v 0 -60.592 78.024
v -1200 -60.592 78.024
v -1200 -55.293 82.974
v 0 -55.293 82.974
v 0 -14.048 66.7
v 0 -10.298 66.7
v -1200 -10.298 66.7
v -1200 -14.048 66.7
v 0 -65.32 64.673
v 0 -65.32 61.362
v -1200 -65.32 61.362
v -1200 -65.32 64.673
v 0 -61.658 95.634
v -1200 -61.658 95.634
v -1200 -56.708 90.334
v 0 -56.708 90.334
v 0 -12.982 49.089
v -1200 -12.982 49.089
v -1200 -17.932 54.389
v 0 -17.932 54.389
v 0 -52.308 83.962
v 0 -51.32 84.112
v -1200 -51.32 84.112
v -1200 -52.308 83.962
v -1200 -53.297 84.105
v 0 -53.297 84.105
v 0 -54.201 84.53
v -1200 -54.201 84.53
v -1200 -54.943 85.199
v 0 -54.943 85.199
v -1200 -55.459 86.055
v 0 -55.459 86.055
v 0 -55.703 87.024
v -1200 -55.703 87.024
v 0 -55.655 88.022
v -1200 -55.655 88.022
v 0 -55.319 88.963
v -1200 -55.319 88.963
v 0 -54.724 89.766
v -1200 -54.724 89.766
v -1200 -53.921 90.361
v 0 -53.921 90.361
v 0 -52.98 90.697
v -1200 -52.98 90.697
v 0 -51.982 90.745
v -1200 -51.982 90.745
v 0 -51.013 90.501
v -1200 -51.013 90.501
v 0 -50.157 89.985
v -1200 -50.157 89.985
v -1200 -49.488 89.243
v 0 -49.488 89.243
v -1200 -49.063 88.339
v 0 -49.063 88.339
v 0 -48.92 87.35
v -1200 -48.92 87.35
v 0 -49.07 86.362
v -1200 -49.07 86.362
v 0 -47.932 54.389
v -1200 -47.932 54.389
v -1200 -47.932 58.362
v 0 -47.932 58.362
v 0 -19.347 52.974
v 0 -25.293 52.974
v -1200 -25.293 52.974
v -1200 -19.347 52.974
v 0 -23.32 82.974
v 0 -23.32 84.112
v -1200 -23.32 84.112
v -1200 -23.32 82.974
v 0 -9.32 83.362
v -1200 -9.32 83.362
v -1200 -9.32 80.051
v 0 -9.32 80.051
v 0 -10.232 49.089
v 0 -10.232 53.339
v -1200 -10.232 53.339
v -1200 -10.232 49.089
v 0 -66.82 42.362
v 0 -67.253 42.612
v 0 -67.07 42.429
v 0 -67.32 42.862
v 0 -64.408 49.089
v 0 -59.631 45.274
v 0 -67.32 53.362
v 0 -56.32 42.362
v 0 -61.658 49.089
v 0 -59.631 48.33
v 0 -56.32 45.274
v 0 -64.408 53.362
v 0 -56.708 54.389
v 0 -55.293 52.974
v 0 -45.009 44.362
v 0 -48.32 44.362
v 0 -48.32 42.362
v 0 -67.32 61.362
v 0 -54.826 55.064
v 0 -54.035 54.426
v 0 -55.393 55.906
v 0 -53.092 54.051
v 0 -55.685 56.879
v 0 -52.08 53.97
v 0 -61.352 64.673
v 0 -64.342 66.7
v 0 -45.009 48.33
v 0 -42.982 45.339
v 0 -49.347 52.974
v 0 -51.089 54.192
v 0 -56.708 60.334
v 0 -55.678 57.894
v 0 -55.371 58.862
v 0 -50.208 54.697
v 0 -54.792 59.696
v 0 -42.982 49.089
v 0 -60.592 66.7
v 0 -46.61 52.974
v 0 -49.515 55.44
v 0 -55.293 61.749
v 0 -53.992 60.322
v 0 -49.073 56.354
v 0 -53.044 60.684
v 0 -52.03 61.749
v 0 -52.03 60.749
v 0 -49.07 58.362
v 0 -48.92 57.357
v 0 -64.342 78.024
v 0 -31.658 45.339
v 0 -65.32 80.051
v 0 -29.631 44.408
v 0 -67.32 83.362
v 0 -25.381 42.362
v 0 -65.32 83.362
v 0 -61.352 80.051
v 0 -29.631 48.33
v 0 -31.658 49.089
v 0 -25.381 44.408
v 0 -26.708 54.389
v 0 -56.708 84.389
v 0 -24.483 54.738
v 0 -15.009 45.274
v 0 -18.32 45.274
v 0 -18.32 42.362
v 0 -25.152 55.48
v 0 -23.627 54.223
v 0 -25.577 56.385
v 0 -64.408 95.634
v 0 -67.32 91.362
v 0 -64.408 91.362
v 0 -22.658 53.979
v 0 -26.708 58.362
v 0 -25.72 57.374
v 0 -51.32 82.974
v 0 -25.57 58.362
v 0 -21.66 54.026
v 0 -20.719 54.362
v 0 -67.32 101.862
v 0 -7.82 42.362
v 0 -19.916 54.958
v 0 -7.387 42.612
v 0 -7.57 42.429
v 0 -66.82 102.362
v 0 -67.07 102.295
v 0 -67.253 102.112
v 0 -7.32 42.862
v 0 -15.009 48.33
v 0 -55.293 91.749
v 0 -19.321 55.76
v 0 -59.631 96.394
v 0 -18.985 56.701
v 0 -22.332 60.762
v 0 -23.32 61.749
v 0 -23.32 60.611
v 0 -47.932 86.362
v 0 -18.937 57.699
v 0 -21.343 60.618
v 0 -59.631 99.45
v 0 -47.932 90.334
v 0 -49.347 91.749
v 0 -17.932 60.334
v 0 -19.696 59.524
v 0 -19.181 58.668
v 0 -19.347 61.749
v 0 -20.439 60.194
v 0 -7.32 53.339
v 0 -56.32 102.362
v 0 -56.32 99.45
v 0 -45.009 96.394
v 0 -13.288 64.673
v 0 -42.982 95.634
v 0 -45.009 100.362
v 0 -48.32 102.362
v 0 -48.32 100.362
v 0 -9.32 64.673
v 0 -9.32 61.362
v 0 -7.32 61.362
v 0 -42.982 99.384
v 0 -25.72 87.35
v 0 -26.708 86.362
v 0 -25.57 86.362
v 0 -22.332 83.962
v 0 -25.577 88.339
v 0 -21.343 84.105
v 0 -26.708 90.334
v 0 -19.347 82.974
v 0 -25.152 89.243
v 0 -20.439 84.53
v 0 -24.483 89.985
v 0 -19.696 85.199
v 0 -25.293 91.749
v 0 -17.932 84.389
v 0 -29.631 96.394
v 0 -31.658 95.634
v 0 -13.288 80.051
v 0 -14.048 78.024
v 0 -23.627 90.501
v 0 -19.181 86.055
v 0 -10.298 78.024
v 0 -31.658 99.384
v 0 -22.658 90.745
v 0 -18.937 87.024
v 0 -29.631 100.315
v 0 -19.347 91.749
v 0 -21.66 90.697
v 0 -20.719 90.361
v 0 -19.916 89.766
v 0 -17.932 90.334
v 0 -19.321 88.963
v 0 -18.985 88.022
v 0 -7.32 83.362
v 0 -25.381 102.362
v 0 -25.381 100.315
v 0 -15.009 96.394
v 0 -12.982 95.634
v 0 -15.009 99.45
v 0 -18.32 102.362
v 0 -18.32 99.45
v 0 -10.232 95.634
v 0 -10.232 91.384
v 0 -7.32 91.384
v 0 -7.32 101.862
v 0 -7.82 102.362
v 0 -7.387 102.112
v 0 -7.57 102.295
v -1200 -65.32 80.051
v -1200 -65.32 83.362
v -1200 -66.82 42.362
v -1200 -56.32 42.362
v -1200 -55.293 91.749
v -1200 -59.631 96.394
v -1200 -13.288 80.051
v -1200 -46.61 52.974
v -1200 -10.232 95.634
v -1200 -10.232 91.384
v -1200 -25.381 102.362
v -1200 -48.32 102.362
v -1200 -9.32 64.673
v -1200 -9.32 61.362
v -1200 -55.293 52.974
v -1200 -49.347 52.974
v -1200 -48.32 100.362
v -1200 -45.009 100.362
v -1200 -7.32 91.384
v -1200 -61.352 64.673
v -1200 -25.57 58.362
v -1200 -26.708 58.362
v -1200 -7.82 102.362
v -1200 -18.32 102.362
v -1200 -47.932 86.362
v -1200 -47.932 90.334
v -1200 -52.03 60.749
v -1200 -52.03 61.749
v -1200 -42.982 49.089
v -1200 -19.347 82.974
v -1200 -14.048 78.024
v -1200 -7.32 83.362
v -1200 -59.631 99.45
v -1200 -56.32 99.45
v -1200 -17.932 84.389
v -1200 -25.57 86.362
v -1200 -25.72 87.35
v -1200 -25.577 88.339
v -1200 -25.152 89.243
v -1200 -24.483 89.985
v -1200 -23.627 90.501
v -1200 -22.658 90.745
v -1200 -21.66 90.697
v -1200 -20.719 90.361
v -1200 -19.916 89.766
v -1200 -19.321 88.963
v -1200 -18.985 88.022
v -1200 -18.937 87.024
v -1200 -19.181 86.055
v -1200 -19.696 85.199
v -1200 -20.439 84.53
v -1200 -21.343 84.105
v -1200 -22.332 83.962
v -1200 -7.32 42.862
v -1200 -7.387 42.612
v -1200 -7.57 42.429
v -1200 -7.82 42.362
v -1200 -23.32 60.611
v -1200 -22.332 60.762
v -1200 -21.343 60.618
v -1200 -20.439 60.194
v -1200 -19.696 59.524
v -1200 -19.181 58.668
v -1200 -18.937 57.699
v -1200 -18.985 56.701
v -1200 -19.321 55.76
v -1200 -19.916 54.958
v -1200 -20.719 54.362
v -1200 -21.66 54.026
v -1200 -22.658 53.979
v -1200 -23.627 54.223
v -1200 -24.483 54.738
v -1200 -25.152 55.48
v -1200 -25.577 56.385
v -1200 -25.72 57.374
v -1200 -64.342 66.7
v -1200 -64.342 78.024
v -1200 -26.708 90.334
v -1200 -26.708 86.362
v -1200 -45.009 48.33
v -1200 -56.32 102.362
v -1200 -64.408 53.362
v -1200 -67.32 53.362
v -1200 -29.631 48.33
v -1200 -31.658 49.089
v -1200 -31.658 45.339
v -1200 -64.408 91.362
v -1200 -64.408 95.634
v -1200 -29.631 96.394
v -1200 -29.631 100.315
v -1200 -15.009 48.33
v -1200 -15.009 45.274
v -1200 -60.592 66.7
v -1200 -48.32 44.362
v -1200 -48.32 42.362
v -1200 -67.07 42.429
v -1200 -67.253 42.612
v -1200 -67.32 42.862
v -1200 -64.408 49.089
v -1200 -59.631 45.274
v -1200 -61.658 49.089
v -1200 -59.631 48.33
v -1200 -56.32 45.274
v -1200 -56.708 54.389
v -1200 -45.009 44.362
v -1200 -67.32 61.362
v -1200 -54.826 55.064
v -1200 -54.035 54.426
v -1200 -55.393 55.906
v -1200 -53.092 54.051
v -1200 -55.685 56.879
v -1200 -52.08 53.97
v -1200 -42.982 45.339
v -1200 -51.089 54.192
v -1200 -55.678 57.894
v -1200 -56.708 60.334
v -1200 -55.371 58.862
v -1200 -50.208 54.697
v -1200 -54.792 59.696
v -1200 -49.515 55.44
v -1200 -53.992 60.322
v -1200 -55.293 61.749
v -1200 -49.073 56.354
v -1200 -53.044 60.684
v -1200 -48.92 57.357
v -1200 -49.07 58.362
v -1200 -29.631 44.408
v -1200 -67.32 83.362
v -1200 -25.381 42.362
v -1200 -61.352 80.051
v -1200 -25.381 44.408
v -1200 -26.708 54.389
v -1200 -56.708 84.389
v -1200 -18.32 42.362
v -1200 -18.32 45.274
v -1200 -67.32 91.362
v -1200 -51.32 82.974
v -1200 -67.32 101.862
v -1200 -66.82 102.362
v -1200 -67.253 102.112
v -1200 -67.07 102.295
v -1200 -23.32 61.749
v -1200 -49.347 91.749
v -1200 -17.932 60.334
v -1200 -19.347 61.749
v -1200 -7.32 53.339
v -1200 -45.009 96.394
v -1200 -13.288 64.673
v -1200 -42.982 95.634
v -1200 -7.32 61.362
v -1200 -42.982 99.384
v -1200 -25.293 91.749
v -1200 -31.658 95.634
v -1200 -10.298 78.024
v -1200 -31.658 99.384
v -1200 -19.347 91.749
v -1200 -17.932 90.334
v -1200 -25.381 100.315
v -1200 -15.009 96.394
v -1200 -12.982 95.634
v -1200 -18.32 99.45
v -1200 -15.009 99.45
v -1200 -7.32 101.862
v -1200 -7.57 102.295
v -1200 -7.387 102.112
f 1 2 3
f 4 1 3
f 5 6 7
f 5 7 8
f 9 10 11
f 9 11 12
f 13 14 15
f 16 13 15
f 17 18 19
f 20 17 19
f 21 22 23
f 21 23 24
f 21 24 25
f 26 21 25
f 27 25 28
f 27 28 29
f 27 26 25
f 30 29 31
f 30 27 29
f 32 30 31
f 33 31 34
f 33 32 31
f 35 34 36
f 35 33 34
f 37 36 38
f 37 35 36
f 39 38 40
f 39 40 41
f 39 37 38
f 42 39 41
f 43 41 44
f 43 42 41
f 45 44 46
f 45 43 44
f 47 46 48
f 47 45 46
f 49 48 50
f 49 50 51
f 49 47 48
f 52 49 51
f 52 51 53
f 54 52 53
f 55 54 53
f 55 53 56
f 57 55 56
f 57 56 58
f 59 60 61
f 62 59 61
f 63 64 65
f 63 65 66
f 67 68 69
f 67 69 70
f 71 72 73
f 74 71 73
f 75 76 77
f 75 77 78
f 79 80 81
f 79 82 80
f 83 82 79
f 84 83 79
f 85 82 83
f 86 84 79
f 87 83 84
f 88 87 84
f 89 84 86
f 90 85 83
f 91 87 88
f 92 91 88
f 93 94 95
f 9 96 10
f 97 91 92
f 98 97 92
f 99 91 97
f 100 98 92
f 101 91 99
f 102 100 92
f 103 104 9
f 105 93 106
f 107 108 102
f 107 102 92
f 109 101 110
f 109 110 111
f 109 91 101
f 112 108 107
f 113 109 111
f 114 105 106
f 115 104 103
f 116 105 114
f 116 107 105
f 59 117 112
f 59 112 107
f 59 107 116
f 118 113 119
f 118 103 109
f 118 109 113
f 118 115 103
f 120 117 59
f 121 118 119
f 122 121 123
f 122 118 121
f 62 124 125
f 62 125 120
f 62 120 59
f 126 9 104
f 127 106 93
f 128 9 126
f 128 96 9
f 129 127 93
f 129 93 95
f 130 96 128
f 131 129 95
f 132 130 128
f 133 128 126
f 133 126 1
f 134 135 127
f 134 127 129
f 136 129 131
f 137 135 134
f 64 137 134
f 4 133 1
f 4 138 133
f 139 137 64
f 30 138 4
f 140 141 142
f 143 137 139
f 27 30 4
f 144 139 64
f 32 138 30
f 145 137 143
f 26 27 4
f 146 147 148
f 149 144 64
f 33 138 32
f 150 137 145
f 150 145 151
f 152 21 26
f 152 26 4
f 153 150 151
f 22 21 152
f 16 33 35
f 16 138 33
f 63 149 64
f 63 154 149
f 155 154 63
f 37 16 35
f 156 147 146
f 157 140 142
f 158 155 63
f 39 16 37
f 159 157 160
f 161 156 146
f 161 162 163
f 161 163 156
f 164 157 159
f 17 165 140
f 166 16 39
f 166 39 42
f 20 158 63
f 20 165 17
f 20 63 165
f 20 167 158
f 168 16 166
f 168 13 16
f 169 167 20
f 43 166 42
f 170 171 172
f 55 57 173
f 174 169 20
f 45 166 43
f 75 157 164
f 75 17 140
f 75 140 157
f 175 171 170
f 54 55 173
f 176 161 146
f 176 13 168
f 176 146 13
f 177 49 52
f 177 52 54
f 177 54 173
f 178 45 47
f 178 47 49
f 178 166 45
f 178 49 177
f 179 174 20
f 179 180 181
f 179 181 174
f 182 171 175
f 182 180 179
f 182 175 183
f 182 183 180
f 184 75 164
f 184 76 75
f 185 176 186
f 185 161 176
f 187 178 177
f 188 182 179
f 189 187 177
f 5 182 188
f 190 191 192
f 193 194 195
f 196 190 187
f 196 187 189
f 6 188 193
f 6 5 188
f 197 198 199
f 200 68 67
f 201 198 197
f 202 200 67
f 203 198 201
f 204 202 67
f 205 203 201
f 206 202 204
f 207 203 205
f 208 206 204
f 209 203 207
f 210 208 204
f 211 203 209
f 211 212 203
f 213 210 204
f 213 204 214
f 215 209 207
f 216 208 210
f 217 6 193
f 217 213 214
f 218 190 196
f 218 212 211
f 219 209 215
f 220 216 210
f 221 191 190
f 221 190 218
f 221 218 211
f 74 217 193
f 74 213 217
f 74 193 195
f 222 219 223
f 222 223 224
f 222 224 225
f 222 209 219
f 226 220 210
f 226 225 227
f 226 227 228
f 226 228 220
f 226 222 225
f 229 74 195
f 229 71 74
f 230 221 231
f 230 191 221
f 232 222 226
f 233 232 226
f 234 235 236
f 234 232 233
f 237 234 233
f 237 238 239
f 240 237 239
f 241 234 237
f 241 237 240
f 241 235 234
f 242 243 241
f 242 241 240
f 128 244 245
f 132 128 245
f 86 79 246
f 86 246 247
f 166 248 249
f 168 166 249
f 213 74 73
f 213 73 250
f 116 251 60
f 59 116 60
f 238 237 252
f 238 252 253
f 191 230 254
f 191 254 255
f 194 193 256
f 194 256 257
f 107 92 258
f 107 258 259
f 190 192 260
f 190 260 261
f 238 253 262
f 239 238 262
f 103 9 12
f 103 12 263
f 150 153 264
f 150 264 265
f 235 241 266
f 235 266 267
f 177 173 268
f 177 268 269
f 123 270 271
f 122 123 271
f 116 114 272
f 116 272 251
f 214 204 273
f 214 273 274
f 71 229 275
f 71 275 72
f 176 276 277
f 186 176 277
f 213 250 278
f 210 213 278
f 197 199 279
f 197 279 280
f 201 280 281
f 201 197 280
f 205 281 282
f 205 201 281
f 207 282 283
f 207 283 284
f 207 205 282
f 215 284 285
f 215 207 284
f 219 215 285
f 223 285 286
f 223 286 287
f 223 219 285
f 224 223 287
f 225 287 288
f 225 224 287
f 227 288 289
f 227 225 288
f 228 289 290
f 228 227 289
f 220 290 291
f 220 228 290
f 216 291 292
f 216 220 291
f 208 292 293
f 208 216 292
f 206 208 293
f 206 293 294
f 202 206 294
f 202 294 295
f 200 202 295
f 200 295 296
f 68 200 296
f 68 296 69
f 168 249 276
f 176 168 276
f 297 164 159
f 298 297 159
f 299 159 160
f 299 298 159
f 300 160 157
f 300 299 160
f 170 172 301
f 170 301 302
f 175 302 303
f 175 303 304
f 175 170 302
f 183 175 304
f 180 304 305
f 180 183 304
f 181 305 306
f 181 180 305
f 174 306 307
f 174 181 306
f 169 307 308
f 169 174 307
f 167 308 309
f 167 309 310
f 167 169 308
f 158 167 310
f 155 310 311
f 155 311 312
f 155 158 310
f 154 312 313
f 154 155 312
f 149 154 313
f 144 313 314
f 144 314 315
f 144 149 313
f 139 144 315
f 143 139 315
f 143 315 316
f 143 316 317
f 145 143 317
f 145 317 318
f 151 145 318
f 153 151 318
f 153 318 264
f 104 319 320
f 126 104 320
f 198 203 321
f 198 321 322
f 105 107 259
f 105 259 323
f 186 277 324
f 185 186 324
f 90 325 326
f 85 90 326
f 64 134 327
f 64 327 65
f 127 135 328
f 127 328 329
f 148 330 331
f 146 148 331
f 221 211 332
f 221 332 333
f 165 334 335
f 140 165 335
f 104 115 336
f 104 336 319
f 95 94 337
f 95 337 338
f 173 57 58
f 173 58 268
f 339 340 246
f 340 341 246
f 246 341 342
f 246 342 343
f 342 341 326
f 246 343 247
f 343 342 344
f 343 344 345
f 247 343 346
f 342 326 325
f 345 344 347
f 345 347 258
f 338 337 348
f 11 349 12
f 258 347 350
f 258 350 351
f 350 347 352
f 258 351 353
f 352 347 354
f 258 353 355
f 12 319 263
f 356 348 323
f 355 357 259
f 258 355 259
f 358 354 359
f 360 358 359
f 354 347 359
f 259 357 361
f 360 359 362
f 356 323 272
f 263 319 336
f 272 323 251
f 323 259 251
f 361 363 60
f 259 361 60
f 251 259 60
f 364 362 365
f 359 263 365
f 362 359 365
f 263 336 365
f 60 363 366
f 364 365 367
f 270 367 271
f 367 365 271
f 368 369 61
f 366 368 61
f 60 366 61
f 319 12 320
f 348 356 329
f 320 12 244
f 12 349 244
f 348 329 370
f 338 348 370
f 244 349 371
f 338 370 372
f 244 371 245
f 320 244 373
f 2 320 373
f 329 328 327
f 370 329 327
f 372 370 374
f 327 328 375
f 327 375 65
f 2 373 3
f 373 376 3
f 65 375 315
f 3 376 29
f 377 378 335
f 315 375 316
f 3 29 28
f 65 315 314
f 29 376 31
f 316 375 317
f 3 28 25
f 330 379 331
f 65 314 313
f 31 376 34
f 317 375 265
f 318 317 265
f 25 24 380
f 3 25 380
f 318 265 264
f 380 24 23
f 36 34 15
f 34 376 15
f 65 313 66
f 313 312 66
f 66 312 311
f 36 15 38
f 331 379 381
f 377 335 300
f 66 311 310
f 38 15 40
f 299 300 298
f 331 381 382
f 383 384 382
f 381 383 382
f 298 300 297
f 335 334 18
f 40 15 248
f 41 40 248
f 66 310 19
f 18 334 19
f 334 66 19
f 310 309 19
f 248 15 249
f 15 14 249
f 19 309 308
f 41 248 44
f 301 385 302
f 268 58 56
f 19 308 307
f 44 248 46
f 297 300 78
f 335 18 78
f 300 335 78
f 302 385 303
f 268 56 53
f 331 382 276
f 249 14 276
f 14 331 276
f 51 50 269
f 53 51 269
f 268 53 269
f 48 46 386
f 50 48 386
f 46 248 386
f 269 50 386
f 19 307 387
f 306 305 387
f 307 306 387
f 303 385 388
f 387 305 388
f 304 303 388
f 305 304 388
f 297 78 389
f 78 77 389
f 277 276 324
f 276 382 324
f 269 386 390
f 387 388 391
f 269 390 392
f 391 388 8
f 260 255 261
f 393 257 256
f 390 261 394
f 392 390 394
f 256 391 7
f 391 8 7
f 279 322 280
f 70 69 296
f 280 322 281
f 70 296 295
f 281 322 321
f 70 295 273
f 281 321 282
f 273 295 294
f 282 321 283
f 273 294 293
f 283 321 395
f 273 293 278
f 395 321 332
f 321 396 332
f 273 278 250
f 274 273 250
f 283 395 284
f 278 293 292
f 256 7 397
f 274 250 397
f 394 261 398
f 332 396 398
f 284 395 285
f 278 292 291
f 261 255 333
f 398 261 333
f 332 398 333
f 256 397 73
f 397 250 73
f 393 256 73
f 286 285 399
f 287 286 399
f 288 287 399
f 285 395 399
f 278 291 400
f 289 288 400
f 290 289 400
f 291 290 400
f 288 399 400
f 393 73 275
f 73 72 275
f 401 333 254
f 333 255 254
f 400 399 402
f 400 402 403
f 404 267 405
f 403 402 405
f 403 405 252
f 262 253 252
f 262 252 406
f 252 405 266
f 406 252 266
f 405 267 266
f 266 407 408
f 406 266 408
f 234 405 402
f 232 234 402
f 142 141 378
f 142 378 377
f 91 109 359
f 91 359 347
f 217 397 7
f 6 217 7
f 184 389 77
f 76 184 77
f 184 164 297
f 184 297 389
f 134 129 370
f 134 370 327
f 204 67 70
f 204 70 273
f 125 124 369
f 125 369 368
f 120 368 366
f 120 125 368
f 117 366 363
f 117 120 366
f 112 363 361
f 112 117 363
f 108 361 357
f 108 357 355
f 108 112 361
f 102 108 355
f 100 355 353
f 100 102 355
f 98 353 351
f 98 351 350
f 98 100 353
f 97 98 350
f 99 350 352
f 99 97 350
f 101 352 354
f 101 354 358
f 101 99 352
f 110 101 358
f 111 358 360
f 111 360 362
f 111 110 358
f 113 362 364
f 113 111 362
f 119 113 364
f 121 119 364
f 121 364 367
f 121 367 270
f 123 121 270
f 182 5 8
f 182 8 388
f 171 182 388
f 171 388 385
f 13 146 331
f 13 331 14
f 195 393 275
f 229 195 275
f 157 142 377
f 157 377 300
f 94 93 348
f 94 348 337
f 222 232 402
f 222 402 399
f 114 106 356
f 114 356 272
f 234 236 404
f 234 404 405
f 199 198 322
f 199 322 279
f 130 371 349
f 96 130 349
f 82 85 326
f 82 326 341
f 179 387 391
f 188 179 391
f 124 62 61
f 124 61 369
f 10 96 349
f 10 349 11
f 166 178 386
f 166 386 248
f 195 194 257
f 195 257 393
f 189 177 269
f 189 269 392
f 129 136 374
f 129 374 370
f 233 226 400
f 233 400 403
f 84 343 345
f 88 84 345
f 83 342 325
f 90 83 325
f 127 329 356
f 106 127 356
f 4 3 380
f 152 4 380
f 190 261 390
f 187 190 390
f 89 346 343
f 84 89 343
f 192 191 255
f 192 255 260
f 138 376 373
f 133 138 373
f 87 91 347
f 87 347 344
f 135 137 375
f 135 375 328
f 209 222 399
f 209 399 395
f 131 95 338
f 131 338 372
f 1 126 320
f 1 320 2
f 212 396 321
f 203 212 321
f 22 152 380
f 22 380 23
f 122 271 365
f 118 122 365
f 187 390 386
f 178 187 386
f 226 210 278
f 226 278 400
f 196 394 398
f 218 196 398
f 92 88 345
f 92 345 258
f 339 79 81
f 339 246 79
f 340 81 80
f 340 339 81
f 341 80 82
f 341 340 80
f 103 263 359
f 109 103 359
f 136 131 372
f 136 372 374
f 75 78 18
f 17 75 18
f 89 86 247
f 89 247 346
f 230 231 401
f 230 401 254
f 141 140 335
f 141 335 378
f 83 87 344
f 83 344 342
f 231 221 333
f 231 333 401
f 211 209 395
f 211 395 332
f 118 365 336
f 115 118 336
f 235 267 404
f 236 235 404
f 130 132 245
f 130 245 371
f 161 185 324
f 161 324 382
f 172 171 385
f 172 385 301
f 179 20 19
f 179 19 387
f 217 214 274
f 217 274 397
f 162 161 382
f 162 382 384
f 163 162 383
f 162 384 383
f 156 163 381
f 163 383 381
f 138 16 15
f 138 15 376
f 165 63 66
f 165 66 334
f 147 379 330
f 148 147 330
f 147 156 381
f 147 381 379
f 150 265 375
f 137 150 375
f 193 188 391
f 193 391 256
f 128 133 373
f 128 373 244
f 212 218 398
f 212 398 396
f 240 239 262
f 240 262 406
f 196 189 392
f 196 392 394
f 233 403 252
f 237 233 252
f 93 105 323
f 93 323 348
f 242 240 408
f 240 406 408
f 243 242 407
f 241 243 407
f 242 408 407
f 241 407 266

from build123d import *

# Parameters (mm, degrees)
F1_DEPTH = 1200
F2_R     = 0.5


with BuildPart() as f1:
    # F0 (on Right) → F1 (new body)
    with BuildSketch(Plane.YZ):
        with BuildLine():
            Line((-47.932279, 54.389084), (-46.610482, 52.97405))
            Line((-46.610482, 52.97405), (-42.981779, 49.089383))
            Line((-42.981779, 49.089383), (-42.981779, 45.339383))
            Line((-42.981779, 45.339383), (-31.658049, 45.339383))
            Line((-31.658049, 45.339383), (-31.658049, 49.089383))
            Line((-31.658049, 49.089383), (-26.70755, 54.389084))
            Line((-26.70755, 54.389084), (-26.70755, 58.361686))
            Line((-26.70755, 58.361686), (-25.56953, 58.361686))
            ThreePointArc((-25.56953, 58.361686), (-19.915751, 54.957523), (-23.319914, 60.611301))
            Line((-23.319914, 60.611301), (-23.319914, 61.749321))
            Line((-23.319914, 61.749321), (-19.347313, 61.749321))
            Line((-19.347313, 61.749321), (-14.047611, 66.699821))
            Line((-14.047611, 66.699821), (-10.297611, 66.699821))
            Line((-10.297611, 66.699821), (-10.297611, 78.02355))
            Line((-10.297611, 78.02355), (-14.047611, 78.02355))
            Line((-14.047611, 78.02355), (-19.347313, 82.97405))
            Line((-19.347313, 82.97405), (-23.319914, 82.97405))
            Line((-23.319914, 82.97405), (-23.319914, 84.11207))
            ThreePointArc((-23.319914, 84.11207), (-19.915751, 89.765849), (-25.56953, 86.361686))
            Line((-25.56953, 86.361686), (-26.70755, 86.361686))
            Line((-26.70755, 86.361686), (-26.70755, 90.334287))
            Line((-26.70755, 90.334287), (-31.658049, 95.633989))
            Line((-31.658049, 95.633989), (-31.658049, 99.383989))
            Line((-31.658049, 99.383989), (-42.981779, 99.383989))
            Line((-42.981779, 99.383989), (-42.981779, 95.633989))
            Line((-42.981779, 95.633989), (-47.932279, 90.334287))
            Line((-47.932279, 90.334287), (-47.932279, 86.361686))
            Line((-47.932279, 86.361686), (-49.070299, 86.361686))
            ThreePointArc((-49.070299, 86.361686), (-54.724077, 89.765849), (-51.319914, 84.11207))
            Line((-51.319914, 84.11207), (-51.319914, 82.97405))
            Line((-51.319914, 82.97405), (-55.292516, 82.97405))
            Line((-55.292516, 82.97405), (-60.592217, 78.02355))
            Line((-60.592217, 78.02355), (-64.342217, 78.02355))
            Line((-64.342217, 78.02355), (-64.342217, 66.699821))
            Line((-64.342217, 66.699821), (-60.592217, 66.699821))
            Line((-60.592217, 66.699821), (-55.292516, 61.749321))
            Line((-55.292516, 61.749321), (-52.030215, 61.749321))
            Line((-52.030215, 61.749321), (-52.030215, 60.749321))
            ThreePointArc((-52.030215, 60.749321), (-54.454601, 54.715346), (-49.070299, 58.361686))
            Line((-49.070299, 58.361686), (-47.932279, 58.361686))
            Line((-47.932279, 58.361686), (-47.932279, 54.389084))
        make_face()
        Polygon((-7.319914, 91.383989), (-7.319914, 102.361686), (-18.319914, 102.361686), (-18.319914, 99.449821), (-15.008826, 99.449821), (-15.008826, 96.393839), (-19.347313, 91.749321), (-23.120943, 91.749321), (-25.292516, 91.749321), (-29.631003, 96.393839), (-29.631003, 99.315412), (-29.631003, 100.315412), (-25.381003, 100.315412), (-25.381003, 102.361686), (-48.319914, 102.361686), (-48.319914, 100.361686), (-45.008826, 100.361686), (-45.008826, 96.393839), (-49.347313, 91.749321), (-55.292516, 91.749321), (-59.631003, 96.393839), (-59.631003, 99.449821), (-56.319914, 99.449821), (-56.319914, 102.361686), (-67.319914, 102.361686), (-67.319914, 91.361686), (-64.408049, 91.361686), (-64.408049, 95.633989), (-61.658049, 95.633989), (-56.70755, 90.334287), (-56.70755, 84.389084), (-61.352068, 80.050597), (-65.319914, 80.050597), (-65.319914, 83.361686), (-67.319914, 83.361686), (-67.319914, 61.361686), (-65.319914, 61.361686), (-65.319914, 64.672774), (-61.352068, 64.672774), (-56.70755, 60.334287), (-56.70755, 54.389084), (-61.658049, 49.089383), (-64.408049, 49.089383), (-64.408049, 53.361686), (-67.319914, 53.361686), (-67.319914, 42.361686), (-56.319914, 42.361686), (-56.319914, 45.27355), (-59.631003, 45.27355), (-59.631003, 48.329532), (-55.292516, 52.97405), (-49.347313, 52.97405), (-45.008826, 48.329532), (-45.008826, 44.361686), (-48.319914, 44.361686), (-48.319914, 42.361686), (-25.381003, 42.361686), (-25.381003, 44.407959), (-29.631003, 44.407959), (-29.631003, 45.407959), (-29.631003, 48.329532), (-25.292516, 52.97405), (-23.120943, 52.97405), (-19.347313, 52.97405), (-15.008826, 48.329532), (-15.008826, 45.27355), (-18.319914, 45.27355), (-18.319914, 42.361686), (-7.319914, 42.361686), (-7.319914, 53.339383), (-10.231779, 53.339383), (-10.231779, 49.089383), (-12.981779, 49.089383), (-17.932279, 54.389084), (-17.932279, 60.334287), (-13.28776, 64.672774), (-9.319914, 64.672774), (-9.319914, 61.361686), (-7.319914, 61.361686), (-7.319914, 83.361686), (-9.319914, 83.361686), (-9.319914, 80.050597), (-13.28776, 80.050597), (-17.932279, 84.389084), (-17.932279, 90.334287), (-12.981779, 95.633989), (-10.231779, 95.633989), (-10.231779, 91.383989), align=None)
        with BuildLine():
            Line((-42.981779, 49.089383), (-46.610482, 52.97405))
            Line((-46.610482, 52.97405), (-47.932279, 54.389084))
            Line((-47.932279, 54.389084), (-47.932279, 58.361686))
            Line((-47.932279, 58.361686), (-49.070299, 58.361686))
            ThreePointArc((-49.070299, 58.361686), (-54.454601, 54.715346), (-52.030215, 60.749321))
            Line((-52.030215, 60.749321), (-52.030215, 61.749321))
            Line((-52.030215, 61.749321), (-55.292516, 61.749321))
            Line((-55.292516, 61.749321), (-60.592217, 66.699821))
            Line((-60.592217, 66.699821), (-64.342217, 66.699821))
            Line((-64.342217, 66.699821), (-64.342217, 78.02355))
            Line((-64.342217, 78.02355), (-60.592217, 78.02355))
            Line((-60.592217, 78.02355), (-55.292516, 82.97405))
            Line((-55.292516, 82.97405), (-51.319914, 82.97405))
            Line((-51.319914, 82.97405), (-51.319914, 84.11207))
            ThreePointArc((-51.319914, 84.11207), (-54.724077, 89.765849), (-49.070299, 86.361686))
            Line((-49.070299, 86.361686), (-47.932279, 86.361686))
            Line((-47.932279, 86.361686), (-47.932279, 90.334287))
            Line((-47.932279, 90.334287), (-42.981779, 95.633989))
            Line((-42.981779, 95.633989), (-42.981779, 99.383989))
            Line((-42.981779, 99.383989), (-31.658049, 99.383989))
            Line((-31.658049, 99.383989), (-31.658049, 95.633989))
            Line((-31.658049, 95.633989), (-26.70755, 90.334287))
            Line((-26.70755, 90.334287), (-26.70755, 86.361686))
            Line((-26.70755, 86.361686), (-25.56953, 86.361686))
            ThreePointArc((-25.56953, 86.361686), (-19.915751, 89.765849), (-23.319914, 84.11207))
            Line((-23.319914, 84.11207), (-23.319914, 82.97405))
            Line((-23.319914, 82.97405), (-19.347313, 82.97405))
            Line((-19.347313, 82.97405), (-14.047611, 78.02355))
            Line((-14.047611, 78.02355), (-10.297611, 78.02355))
            Line((-10.297611, 78.02355), (-10.297611, 66.699821))
            Line((-10.297611, 66.699821), (-14.047611, 66.699821))
            Line((-14.047611, 66.699821), (-19.347313, 61.749321))
            Line((-19.347313, 61.749321), (-23.319914, 61.749321))
            Line((-23.319914, 61.749321), (-23.319914, 60.611301))
            ThreePointArc((-23.319914, 60.611301), (-19.915751, 54.957523), (-25.56953, 58.361686))
            Line((-25.56953, 58.361686), (-26.70755, 58.361686))
            Line((-26.70755, 58.361686), (-26.70755, 54.389084))
            Line((-26.70755, 54.389084), (-31.658049, 49.089383))
            Line((-31.658049, 49.089383), (-31.658049, 45.339383))
            Line((-31.658049, 45.339383), (-42.981779, 45.339383))
            Line((-42.981779, 45.339383), (-42.981779, 49.089383))
        make_face(mode=Mode.SUBTRACT)
    extrude(amount=-F1_DEPTH)

    # F2
    f2_edges = [f1.edges().sort_by_distance(p)[0] for p in [
        (-600, -7.319914, 102.361686),
        (-600, -67.319914, 102.361686),
        (-600, -7.319914, 42.361686),
        (-600, -67.319914, 42.361686),
    ]]
    fillet(f2_edges, radius=F2_R)


solid = f1.part
